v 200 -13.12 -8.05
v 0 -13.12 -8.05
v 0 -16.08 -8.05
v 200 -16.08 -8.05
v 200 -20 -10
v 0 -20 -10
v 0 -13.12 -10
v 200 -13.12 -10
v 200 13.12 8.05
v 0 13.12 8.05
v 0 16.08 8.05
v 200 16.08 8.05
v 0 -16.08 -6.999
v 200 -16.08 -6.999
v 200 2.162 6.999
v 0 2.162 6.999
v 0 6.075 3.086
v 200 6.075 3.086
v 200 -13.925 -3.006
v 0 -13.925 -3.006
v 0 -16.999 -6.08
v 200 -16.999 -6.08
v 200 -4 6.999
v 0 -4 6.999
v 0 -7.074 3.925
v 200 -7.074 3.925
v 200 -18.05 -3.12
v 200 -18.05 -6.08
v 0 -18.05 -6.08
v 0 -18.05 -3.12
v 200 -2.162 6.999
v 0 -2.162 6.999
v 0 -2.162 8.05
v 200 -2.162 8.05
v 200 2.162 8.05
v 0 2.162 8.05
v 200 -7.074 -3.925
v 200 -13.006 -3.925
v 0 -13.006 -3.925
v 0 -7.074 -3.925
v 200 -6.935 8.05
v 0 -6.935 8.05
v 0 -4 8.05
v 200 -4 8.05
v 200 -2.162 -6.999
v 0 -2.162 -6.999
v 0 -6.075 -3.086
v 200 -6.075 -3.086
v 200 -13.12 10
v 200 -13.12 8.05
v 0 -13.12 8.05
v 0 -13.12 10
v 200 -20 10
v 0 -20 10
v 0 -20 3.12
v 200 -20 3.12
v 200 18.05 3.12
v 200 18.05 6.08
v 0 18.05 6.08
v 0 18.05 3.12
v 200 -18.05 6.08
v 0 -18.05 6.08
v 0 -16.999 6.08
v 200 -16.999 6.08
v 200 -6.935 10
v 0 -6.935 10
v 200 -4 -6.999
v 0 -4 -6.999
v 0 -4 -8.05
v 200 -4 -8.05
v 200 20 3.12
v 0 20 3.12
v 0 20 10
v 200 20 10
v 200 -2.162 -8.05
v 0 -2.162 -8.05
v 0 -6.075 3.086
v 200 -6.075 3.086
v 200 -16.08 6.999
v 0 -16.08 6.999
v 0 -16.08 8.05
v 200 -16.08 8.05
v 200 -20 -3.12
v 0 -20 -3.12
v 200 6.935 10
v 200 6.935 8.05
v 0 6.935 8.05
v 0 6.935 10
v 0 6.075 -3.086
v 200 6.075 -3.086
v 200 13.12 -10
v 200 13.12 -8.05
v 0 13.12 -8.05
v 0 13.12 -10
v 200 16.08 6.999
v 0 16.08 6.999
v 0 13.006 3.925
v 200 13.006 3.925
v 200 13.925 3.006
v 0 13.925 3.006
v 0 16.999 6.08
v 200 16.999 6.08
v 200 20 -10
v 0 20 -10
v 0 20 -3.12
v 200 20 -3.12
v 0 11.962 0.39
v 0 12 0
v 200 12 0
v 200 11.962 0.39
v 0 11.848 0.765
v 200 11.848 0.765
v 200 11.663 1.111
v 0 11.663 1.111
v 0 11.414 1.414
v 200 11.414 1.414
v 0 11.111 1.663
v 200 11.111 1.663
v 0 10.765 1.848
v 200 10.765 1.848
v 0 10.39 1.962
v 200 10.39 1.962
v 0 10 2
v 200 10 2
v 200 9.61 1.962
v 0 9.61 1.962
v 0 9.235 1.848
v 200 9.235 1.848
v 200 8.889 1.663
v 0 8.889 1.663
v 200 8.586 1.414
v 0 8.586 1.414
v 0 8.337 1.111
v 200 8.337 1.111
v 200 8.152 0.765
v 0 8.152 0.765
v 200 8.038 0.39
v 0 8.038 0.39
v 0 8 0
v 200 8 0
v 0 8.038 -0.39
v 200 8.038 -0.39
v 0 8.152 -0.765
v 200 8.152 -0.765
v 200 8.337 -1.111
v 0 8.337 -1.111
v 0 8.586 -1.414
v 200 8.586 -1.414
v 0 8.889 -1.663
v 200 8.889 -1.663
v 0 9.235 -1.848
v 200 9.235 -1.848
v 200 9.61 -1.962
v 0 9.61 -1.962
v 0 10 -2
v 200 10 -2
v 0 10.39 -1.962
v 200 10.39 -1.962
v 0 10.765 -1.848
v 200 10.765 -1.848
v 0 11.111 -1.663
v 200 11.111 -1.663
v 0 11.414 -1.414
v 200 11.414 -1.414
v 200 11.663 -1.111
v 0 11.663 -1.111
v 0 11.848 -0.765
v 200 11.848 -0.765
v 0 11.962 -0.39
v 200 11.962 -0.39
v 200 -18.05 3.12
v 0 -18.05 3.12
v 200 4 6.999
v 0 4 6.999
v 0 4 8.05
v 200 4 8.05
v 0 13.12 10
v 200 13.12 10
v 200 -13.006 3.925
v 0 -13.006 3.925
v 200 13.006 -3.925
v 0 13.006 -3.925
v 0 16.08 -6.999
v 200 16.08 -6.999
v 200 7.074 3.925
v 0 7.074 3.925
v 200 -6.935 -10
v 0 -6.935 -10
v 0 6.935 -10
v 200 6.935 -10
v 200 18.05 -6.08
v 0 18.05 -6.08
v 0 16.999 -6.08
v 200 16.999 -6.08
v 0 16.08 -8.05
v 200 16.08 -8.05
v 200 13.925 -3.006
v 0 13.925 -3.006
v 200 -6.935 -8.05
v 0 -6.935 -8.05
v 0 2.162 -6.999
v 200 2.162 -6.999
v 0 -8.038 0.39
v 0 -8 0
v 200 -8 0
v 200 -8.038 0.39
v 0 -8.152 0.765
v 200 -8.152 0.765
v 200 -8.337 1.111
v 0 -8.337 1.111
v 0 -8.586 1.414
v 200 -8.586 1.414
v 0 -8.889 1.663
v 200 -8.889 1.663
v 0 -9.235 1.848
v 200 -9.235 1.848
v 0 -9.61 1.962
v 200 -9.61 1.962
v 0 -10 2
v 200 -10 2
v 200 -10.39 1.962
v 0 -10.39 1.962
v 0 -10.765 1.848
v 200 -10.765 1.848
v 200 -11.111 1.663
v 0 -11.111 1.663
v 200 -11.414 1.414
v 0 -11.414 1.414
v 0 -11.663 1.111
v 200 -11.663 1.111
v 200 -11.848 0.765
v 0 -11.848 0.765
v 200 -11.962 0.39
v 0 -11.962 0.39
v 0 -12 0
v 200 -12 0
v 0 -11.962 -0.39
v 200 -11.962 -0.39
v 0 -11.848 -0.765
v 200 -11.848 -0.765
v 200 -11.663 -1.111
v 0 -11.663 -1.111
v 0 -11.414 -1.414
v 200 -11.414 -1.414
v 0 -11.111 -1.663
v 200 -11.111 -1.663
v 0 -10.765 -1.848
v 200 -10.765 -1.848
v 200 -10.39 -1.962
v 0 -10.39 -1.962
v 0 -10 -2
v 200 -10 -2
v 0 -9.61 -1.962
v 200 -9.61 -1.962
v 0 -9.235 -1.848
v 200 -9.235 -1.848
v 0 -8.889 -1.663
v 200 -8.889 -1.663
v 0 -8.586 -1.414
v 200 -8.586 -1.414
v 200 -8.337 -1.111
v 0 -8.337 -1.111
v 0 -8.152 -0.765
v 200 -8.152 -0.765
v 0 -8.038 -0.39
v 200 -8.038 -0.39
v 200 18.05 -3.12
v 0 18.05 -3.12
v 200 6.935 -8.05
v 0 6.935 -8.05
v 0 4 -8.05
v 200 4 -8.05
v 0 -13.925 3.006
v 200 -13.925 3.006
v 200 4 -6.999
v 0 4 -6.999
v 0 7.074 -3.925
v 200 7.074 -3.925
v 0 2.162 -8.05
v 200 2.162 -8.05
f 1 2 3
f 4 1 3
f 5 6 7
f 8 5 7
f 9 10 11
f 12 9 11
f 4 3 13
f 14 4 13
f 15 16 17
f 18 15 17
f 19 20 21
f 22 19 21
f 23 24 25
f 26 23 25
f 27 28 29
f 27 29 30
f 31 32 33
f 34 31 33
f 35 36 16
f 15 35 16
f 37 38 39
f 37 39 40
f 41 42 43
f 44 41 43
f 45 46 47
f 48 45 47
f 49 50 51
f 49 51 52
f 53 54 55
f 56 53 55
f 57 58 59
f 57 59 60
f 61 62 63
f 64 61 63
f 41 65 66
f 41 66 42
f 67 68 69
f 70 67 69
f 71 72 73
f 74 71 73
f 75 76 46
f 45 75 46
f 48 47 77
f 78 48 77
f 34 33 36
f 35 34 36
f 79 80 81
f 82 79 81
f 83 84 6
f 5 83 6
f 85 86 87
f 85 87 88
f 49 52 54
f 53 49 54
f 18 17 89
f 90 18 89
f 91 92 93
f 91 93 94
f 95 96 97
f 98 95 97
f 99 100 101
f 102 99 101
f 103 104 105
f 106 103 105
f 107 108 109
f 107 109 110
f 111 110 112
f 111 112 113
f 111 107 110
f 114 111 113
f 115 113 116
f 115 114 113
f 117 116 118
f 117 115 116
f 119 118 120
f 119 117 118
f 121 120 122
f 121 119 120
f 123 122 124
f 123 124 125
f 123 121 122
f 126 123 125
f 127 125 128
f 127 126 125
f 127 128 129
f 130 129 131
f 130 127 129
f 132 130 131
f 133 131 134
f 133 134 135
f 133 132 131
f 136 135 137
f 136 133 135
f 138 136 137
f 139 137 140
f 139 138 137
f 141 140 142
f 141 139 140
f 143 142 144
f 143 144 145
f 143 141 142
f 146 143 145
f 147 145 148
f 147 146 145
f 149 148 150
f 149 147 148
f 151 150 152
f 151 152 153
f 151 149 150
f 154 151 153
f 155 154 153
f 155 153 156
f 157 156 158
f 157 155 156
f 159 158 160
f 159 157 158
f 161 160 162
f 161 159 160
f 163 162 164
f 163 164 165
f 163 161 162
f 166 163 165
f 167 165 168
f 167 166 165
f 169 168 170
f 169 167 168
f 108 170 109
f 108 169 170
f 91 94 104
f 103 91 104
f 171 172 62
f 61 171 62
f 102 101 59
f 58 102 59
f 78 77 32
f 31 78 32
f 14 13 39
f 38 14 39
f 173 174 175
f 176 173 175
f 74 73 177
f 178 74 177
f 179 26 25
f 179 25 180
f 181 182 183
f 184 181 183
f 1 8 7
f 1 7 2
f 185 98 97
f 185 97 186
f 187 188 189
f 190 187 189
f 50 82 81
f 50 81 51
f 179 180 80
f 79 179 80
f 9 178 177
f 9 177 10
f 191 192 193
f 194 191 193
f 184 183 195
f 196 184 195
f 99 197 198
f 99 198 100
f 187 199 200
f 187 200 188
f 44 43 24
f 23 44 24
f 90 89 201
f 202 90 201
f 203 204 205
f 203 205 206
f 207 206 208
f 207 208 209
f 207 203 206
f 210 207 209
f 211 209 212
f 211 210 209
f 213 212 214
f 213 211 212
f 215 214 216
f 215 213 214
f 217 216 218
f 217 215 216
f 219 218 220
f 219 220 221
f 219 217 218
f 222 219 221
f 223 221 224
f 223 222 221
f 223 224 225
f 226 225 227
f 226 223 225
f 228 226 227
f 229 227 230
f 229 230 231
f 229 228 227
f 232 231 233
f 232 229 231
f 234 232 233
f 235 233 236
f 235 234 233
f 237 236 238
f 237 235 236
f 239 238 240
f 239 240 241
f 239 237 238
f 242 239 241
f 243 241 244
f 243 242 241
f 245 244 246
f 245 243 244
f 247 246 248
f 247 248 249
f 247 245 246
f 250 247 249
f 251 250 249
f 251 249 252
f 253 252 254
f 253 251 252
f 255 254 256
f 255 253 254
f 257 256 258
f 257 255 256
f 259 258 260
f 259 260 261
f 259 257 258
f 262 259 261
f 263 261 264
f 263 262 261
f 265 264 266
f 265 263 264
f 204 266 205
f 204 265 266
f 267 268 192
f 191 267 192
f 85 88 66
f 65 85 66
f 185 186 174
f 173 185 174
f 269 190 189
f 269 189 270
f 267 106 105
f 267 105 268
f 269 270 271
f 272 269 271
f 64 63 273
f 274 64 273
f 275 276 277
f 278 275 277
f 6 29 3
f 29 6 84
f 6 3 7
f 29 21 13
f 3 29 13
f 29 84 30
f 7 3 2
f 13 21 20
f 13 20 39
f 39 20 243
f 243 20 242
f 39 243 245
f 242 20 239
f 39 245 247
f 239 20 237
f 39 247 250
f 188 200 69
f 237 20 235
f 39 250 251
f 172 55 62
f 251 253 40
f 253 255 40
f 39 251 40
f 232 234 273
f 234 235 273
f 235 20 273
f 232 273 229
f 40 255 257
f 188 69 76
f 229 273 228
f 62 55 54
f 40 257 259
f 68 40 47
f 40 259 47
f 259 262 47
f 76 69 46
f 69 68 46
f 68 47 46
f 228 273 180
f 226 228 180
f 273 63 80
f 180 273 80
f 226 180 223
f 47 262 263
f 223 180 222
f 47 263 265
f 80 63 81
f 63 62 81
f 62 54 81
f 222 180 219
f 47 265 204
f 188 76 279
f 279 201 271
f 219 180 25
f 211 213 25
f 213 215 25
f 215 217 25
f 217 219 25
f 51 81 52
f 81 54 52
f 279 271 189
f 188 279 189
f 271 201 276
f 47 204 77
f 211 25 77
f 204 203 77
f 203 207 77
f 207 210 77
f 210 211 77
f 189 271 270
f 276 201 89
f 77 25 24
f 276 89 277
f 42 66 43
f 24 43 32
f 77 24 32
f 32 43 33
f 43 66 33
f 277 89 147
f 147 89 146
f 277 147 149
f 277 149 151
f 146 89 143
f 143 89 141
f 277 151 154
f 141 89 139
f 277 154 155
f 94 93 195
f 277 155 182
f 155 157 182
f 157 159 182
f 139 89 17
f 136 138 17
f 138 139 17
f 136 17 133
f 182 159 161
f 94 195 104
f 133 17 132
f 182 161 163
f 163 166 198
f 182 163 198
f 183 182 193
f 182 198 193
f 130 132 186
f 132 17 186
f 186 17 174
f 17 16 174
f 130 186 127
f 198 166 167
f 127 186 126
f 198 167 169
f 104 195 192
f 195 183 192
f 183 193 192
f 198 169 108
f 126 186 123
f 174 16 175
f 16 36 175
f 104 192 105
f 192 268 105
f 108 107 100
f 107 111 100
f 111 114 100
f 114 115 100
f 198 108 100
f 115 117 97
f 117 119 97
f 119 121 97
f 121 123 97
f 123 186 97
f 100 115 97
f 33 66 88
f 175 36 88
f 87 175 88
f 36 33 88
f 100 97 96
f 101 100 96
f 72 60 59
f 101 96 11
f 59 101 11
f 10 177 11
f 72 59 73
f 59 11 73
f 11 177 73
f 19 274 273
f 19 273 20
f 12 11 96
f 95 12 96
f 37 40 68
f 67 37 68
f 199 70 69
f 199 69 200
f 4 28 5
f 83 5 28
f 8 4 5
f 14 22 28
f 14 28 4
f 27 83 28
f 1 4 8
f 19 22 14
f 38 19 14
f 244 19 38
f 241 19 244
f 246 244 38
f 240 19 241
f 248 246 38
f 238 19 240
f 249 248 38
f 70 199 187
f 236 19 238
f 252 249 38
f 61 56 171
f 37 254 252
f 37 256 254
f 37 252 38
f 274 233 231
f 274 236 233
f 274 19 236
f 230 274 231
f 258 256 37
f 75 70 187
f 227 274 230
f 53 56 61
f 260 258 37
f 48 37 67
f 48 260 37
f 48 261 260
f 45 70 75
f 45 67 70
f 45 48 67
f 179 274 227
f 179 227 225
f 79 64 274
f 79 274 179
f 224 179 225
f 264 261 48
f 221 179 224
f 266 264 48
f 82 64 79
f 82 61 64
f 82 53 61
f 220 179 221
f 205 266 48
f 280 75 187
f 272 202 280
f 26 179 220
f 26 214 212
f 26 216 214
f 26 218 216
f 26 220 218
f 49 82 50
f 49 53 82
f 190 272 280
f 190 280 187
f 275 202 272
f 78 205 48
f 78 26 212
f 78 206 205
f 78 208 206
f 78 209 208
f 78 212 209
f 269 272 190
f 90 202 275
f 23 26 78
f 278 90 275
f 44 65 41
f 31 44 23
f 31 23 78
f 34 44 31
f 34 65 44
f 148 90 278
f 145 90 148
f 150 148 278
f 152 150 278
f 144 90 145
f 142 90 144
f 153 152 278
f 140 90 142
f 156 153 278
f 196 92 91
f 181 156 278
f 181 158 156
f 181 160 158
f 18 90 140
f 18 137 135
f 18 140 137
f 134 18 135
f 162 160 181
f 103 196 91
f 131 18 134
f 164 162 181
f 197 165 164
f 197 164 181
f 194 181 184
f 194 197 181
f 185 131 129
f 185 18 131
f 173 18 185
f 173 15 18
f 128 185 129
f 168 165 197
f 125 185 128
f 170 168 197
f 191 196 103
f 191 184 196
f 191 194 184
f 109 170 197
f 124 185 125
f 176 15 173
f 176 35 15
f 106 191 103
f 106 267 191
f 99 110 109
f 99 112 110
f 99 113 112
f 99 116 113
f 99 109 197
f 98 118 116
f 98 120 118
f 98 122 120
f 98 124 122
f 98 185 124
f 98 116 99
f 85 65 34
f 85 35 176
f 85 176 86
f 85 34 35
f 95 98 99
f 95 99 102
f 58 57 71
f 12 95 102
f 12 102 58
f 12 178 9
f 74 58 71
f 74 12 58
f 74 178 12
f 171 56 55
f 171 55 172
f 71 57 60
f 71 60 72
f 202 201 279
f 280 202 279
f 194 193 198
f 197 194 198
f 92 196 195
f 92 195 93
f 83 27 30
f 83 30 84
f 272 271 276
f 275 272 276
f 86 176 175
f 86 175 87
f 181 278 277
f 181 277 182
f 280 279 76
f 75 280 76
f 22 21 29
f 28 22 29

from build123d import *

# Parameters (mm, degrees)
F0_R     = 2
F1_DEPTH = 200


with BuildPart() as f1:
    # F0 (on Right) → F1 (new body)
    with BuildSketch(Plane.YZ):
        Polygon((6.935, 10), (0, 10), (-6.935, 10), (-6.935, 8.05), (-4, 8.05), (-4, 6.999239), (-7.074239, 3.925), (-13.005761, 3.925), (-16.08, 6.999239), (-16.08, 8.05), (-13.12, 8.05), (-13.12, 10), (-20, 10), (-20, 3.12), (-18.05, 3.12), (-18.05, 6.08), (-16.999239, 6.08), (-13.925, 3.005761), (-13.925, 0), (-13.925, -3.005761), (-16.999239, -6.08), (-18.05, -6.08), (-18.05, -3.12), (-20, -3.12), (-20, -10), (-13.12, -10), (-13.12, -8.05), (-16.08, -8.05), (-16.08, -6.999239), (-13.005761, -3.925), (-7.074239, -3.925), (-4, -6.999239), (-4, -8.05), (-6.935, -8.05), (-6.935, -10), (0, -10), (6.935, -10), (6.935, -8.05), (4, -8.05), (4, -6.999239), (7.074239, -3.925), (13.005761, -3.925), (16.08, -6.999239), (16.08, -8.05), (13.12, -8.05), (13.12, -10), (20, -10), (20, -3.12), (18.05, -3.12), (18.05, -6.08), (16.999239, -6.08), (13.925, -3.005761), (13.925, 0), (13.925, 3.005761), (16.999239, 6.08), (18.05, 6.08), (18.05, 3.12), (20, 3.12), (20, 10), (13.12, 10), (13.12, 8.05), (16.08, 8.05), (16.08, 6.999239), (13.005761, 3.925), (7.074239, 3.925), (4, 6.999239), (4, 8.05), (6.935, 8.05), align=None)
        with Locations((-10, 0)):
            Circle(F0_R, mode=Mode.SUBTRACT)
        Polygon((-2.161522, 8.05), (0, 8.05), (2.161522, 8.05), (2.161522, 6.999239), (6.075, 3.085761), (6.075, 0), (6.075, -3.085761), (2.161522, -6.999239), (2.161522, -8.05), (0, -8.05), (-2.161522, -8.05), (-2.161522, -6.999239), (-6.075, -3.085761), (-6.075, 0), (-6.075, 3.085761), (-2.161522, 6.999239), align=None, mode=Mode.SUBTRACT)
        with Locations((10, 0)):
            Circle(F0_R, mode=Mode.SUBTRACT)
    extrude(amount=F1_DEPTH)


solid = f1.part
